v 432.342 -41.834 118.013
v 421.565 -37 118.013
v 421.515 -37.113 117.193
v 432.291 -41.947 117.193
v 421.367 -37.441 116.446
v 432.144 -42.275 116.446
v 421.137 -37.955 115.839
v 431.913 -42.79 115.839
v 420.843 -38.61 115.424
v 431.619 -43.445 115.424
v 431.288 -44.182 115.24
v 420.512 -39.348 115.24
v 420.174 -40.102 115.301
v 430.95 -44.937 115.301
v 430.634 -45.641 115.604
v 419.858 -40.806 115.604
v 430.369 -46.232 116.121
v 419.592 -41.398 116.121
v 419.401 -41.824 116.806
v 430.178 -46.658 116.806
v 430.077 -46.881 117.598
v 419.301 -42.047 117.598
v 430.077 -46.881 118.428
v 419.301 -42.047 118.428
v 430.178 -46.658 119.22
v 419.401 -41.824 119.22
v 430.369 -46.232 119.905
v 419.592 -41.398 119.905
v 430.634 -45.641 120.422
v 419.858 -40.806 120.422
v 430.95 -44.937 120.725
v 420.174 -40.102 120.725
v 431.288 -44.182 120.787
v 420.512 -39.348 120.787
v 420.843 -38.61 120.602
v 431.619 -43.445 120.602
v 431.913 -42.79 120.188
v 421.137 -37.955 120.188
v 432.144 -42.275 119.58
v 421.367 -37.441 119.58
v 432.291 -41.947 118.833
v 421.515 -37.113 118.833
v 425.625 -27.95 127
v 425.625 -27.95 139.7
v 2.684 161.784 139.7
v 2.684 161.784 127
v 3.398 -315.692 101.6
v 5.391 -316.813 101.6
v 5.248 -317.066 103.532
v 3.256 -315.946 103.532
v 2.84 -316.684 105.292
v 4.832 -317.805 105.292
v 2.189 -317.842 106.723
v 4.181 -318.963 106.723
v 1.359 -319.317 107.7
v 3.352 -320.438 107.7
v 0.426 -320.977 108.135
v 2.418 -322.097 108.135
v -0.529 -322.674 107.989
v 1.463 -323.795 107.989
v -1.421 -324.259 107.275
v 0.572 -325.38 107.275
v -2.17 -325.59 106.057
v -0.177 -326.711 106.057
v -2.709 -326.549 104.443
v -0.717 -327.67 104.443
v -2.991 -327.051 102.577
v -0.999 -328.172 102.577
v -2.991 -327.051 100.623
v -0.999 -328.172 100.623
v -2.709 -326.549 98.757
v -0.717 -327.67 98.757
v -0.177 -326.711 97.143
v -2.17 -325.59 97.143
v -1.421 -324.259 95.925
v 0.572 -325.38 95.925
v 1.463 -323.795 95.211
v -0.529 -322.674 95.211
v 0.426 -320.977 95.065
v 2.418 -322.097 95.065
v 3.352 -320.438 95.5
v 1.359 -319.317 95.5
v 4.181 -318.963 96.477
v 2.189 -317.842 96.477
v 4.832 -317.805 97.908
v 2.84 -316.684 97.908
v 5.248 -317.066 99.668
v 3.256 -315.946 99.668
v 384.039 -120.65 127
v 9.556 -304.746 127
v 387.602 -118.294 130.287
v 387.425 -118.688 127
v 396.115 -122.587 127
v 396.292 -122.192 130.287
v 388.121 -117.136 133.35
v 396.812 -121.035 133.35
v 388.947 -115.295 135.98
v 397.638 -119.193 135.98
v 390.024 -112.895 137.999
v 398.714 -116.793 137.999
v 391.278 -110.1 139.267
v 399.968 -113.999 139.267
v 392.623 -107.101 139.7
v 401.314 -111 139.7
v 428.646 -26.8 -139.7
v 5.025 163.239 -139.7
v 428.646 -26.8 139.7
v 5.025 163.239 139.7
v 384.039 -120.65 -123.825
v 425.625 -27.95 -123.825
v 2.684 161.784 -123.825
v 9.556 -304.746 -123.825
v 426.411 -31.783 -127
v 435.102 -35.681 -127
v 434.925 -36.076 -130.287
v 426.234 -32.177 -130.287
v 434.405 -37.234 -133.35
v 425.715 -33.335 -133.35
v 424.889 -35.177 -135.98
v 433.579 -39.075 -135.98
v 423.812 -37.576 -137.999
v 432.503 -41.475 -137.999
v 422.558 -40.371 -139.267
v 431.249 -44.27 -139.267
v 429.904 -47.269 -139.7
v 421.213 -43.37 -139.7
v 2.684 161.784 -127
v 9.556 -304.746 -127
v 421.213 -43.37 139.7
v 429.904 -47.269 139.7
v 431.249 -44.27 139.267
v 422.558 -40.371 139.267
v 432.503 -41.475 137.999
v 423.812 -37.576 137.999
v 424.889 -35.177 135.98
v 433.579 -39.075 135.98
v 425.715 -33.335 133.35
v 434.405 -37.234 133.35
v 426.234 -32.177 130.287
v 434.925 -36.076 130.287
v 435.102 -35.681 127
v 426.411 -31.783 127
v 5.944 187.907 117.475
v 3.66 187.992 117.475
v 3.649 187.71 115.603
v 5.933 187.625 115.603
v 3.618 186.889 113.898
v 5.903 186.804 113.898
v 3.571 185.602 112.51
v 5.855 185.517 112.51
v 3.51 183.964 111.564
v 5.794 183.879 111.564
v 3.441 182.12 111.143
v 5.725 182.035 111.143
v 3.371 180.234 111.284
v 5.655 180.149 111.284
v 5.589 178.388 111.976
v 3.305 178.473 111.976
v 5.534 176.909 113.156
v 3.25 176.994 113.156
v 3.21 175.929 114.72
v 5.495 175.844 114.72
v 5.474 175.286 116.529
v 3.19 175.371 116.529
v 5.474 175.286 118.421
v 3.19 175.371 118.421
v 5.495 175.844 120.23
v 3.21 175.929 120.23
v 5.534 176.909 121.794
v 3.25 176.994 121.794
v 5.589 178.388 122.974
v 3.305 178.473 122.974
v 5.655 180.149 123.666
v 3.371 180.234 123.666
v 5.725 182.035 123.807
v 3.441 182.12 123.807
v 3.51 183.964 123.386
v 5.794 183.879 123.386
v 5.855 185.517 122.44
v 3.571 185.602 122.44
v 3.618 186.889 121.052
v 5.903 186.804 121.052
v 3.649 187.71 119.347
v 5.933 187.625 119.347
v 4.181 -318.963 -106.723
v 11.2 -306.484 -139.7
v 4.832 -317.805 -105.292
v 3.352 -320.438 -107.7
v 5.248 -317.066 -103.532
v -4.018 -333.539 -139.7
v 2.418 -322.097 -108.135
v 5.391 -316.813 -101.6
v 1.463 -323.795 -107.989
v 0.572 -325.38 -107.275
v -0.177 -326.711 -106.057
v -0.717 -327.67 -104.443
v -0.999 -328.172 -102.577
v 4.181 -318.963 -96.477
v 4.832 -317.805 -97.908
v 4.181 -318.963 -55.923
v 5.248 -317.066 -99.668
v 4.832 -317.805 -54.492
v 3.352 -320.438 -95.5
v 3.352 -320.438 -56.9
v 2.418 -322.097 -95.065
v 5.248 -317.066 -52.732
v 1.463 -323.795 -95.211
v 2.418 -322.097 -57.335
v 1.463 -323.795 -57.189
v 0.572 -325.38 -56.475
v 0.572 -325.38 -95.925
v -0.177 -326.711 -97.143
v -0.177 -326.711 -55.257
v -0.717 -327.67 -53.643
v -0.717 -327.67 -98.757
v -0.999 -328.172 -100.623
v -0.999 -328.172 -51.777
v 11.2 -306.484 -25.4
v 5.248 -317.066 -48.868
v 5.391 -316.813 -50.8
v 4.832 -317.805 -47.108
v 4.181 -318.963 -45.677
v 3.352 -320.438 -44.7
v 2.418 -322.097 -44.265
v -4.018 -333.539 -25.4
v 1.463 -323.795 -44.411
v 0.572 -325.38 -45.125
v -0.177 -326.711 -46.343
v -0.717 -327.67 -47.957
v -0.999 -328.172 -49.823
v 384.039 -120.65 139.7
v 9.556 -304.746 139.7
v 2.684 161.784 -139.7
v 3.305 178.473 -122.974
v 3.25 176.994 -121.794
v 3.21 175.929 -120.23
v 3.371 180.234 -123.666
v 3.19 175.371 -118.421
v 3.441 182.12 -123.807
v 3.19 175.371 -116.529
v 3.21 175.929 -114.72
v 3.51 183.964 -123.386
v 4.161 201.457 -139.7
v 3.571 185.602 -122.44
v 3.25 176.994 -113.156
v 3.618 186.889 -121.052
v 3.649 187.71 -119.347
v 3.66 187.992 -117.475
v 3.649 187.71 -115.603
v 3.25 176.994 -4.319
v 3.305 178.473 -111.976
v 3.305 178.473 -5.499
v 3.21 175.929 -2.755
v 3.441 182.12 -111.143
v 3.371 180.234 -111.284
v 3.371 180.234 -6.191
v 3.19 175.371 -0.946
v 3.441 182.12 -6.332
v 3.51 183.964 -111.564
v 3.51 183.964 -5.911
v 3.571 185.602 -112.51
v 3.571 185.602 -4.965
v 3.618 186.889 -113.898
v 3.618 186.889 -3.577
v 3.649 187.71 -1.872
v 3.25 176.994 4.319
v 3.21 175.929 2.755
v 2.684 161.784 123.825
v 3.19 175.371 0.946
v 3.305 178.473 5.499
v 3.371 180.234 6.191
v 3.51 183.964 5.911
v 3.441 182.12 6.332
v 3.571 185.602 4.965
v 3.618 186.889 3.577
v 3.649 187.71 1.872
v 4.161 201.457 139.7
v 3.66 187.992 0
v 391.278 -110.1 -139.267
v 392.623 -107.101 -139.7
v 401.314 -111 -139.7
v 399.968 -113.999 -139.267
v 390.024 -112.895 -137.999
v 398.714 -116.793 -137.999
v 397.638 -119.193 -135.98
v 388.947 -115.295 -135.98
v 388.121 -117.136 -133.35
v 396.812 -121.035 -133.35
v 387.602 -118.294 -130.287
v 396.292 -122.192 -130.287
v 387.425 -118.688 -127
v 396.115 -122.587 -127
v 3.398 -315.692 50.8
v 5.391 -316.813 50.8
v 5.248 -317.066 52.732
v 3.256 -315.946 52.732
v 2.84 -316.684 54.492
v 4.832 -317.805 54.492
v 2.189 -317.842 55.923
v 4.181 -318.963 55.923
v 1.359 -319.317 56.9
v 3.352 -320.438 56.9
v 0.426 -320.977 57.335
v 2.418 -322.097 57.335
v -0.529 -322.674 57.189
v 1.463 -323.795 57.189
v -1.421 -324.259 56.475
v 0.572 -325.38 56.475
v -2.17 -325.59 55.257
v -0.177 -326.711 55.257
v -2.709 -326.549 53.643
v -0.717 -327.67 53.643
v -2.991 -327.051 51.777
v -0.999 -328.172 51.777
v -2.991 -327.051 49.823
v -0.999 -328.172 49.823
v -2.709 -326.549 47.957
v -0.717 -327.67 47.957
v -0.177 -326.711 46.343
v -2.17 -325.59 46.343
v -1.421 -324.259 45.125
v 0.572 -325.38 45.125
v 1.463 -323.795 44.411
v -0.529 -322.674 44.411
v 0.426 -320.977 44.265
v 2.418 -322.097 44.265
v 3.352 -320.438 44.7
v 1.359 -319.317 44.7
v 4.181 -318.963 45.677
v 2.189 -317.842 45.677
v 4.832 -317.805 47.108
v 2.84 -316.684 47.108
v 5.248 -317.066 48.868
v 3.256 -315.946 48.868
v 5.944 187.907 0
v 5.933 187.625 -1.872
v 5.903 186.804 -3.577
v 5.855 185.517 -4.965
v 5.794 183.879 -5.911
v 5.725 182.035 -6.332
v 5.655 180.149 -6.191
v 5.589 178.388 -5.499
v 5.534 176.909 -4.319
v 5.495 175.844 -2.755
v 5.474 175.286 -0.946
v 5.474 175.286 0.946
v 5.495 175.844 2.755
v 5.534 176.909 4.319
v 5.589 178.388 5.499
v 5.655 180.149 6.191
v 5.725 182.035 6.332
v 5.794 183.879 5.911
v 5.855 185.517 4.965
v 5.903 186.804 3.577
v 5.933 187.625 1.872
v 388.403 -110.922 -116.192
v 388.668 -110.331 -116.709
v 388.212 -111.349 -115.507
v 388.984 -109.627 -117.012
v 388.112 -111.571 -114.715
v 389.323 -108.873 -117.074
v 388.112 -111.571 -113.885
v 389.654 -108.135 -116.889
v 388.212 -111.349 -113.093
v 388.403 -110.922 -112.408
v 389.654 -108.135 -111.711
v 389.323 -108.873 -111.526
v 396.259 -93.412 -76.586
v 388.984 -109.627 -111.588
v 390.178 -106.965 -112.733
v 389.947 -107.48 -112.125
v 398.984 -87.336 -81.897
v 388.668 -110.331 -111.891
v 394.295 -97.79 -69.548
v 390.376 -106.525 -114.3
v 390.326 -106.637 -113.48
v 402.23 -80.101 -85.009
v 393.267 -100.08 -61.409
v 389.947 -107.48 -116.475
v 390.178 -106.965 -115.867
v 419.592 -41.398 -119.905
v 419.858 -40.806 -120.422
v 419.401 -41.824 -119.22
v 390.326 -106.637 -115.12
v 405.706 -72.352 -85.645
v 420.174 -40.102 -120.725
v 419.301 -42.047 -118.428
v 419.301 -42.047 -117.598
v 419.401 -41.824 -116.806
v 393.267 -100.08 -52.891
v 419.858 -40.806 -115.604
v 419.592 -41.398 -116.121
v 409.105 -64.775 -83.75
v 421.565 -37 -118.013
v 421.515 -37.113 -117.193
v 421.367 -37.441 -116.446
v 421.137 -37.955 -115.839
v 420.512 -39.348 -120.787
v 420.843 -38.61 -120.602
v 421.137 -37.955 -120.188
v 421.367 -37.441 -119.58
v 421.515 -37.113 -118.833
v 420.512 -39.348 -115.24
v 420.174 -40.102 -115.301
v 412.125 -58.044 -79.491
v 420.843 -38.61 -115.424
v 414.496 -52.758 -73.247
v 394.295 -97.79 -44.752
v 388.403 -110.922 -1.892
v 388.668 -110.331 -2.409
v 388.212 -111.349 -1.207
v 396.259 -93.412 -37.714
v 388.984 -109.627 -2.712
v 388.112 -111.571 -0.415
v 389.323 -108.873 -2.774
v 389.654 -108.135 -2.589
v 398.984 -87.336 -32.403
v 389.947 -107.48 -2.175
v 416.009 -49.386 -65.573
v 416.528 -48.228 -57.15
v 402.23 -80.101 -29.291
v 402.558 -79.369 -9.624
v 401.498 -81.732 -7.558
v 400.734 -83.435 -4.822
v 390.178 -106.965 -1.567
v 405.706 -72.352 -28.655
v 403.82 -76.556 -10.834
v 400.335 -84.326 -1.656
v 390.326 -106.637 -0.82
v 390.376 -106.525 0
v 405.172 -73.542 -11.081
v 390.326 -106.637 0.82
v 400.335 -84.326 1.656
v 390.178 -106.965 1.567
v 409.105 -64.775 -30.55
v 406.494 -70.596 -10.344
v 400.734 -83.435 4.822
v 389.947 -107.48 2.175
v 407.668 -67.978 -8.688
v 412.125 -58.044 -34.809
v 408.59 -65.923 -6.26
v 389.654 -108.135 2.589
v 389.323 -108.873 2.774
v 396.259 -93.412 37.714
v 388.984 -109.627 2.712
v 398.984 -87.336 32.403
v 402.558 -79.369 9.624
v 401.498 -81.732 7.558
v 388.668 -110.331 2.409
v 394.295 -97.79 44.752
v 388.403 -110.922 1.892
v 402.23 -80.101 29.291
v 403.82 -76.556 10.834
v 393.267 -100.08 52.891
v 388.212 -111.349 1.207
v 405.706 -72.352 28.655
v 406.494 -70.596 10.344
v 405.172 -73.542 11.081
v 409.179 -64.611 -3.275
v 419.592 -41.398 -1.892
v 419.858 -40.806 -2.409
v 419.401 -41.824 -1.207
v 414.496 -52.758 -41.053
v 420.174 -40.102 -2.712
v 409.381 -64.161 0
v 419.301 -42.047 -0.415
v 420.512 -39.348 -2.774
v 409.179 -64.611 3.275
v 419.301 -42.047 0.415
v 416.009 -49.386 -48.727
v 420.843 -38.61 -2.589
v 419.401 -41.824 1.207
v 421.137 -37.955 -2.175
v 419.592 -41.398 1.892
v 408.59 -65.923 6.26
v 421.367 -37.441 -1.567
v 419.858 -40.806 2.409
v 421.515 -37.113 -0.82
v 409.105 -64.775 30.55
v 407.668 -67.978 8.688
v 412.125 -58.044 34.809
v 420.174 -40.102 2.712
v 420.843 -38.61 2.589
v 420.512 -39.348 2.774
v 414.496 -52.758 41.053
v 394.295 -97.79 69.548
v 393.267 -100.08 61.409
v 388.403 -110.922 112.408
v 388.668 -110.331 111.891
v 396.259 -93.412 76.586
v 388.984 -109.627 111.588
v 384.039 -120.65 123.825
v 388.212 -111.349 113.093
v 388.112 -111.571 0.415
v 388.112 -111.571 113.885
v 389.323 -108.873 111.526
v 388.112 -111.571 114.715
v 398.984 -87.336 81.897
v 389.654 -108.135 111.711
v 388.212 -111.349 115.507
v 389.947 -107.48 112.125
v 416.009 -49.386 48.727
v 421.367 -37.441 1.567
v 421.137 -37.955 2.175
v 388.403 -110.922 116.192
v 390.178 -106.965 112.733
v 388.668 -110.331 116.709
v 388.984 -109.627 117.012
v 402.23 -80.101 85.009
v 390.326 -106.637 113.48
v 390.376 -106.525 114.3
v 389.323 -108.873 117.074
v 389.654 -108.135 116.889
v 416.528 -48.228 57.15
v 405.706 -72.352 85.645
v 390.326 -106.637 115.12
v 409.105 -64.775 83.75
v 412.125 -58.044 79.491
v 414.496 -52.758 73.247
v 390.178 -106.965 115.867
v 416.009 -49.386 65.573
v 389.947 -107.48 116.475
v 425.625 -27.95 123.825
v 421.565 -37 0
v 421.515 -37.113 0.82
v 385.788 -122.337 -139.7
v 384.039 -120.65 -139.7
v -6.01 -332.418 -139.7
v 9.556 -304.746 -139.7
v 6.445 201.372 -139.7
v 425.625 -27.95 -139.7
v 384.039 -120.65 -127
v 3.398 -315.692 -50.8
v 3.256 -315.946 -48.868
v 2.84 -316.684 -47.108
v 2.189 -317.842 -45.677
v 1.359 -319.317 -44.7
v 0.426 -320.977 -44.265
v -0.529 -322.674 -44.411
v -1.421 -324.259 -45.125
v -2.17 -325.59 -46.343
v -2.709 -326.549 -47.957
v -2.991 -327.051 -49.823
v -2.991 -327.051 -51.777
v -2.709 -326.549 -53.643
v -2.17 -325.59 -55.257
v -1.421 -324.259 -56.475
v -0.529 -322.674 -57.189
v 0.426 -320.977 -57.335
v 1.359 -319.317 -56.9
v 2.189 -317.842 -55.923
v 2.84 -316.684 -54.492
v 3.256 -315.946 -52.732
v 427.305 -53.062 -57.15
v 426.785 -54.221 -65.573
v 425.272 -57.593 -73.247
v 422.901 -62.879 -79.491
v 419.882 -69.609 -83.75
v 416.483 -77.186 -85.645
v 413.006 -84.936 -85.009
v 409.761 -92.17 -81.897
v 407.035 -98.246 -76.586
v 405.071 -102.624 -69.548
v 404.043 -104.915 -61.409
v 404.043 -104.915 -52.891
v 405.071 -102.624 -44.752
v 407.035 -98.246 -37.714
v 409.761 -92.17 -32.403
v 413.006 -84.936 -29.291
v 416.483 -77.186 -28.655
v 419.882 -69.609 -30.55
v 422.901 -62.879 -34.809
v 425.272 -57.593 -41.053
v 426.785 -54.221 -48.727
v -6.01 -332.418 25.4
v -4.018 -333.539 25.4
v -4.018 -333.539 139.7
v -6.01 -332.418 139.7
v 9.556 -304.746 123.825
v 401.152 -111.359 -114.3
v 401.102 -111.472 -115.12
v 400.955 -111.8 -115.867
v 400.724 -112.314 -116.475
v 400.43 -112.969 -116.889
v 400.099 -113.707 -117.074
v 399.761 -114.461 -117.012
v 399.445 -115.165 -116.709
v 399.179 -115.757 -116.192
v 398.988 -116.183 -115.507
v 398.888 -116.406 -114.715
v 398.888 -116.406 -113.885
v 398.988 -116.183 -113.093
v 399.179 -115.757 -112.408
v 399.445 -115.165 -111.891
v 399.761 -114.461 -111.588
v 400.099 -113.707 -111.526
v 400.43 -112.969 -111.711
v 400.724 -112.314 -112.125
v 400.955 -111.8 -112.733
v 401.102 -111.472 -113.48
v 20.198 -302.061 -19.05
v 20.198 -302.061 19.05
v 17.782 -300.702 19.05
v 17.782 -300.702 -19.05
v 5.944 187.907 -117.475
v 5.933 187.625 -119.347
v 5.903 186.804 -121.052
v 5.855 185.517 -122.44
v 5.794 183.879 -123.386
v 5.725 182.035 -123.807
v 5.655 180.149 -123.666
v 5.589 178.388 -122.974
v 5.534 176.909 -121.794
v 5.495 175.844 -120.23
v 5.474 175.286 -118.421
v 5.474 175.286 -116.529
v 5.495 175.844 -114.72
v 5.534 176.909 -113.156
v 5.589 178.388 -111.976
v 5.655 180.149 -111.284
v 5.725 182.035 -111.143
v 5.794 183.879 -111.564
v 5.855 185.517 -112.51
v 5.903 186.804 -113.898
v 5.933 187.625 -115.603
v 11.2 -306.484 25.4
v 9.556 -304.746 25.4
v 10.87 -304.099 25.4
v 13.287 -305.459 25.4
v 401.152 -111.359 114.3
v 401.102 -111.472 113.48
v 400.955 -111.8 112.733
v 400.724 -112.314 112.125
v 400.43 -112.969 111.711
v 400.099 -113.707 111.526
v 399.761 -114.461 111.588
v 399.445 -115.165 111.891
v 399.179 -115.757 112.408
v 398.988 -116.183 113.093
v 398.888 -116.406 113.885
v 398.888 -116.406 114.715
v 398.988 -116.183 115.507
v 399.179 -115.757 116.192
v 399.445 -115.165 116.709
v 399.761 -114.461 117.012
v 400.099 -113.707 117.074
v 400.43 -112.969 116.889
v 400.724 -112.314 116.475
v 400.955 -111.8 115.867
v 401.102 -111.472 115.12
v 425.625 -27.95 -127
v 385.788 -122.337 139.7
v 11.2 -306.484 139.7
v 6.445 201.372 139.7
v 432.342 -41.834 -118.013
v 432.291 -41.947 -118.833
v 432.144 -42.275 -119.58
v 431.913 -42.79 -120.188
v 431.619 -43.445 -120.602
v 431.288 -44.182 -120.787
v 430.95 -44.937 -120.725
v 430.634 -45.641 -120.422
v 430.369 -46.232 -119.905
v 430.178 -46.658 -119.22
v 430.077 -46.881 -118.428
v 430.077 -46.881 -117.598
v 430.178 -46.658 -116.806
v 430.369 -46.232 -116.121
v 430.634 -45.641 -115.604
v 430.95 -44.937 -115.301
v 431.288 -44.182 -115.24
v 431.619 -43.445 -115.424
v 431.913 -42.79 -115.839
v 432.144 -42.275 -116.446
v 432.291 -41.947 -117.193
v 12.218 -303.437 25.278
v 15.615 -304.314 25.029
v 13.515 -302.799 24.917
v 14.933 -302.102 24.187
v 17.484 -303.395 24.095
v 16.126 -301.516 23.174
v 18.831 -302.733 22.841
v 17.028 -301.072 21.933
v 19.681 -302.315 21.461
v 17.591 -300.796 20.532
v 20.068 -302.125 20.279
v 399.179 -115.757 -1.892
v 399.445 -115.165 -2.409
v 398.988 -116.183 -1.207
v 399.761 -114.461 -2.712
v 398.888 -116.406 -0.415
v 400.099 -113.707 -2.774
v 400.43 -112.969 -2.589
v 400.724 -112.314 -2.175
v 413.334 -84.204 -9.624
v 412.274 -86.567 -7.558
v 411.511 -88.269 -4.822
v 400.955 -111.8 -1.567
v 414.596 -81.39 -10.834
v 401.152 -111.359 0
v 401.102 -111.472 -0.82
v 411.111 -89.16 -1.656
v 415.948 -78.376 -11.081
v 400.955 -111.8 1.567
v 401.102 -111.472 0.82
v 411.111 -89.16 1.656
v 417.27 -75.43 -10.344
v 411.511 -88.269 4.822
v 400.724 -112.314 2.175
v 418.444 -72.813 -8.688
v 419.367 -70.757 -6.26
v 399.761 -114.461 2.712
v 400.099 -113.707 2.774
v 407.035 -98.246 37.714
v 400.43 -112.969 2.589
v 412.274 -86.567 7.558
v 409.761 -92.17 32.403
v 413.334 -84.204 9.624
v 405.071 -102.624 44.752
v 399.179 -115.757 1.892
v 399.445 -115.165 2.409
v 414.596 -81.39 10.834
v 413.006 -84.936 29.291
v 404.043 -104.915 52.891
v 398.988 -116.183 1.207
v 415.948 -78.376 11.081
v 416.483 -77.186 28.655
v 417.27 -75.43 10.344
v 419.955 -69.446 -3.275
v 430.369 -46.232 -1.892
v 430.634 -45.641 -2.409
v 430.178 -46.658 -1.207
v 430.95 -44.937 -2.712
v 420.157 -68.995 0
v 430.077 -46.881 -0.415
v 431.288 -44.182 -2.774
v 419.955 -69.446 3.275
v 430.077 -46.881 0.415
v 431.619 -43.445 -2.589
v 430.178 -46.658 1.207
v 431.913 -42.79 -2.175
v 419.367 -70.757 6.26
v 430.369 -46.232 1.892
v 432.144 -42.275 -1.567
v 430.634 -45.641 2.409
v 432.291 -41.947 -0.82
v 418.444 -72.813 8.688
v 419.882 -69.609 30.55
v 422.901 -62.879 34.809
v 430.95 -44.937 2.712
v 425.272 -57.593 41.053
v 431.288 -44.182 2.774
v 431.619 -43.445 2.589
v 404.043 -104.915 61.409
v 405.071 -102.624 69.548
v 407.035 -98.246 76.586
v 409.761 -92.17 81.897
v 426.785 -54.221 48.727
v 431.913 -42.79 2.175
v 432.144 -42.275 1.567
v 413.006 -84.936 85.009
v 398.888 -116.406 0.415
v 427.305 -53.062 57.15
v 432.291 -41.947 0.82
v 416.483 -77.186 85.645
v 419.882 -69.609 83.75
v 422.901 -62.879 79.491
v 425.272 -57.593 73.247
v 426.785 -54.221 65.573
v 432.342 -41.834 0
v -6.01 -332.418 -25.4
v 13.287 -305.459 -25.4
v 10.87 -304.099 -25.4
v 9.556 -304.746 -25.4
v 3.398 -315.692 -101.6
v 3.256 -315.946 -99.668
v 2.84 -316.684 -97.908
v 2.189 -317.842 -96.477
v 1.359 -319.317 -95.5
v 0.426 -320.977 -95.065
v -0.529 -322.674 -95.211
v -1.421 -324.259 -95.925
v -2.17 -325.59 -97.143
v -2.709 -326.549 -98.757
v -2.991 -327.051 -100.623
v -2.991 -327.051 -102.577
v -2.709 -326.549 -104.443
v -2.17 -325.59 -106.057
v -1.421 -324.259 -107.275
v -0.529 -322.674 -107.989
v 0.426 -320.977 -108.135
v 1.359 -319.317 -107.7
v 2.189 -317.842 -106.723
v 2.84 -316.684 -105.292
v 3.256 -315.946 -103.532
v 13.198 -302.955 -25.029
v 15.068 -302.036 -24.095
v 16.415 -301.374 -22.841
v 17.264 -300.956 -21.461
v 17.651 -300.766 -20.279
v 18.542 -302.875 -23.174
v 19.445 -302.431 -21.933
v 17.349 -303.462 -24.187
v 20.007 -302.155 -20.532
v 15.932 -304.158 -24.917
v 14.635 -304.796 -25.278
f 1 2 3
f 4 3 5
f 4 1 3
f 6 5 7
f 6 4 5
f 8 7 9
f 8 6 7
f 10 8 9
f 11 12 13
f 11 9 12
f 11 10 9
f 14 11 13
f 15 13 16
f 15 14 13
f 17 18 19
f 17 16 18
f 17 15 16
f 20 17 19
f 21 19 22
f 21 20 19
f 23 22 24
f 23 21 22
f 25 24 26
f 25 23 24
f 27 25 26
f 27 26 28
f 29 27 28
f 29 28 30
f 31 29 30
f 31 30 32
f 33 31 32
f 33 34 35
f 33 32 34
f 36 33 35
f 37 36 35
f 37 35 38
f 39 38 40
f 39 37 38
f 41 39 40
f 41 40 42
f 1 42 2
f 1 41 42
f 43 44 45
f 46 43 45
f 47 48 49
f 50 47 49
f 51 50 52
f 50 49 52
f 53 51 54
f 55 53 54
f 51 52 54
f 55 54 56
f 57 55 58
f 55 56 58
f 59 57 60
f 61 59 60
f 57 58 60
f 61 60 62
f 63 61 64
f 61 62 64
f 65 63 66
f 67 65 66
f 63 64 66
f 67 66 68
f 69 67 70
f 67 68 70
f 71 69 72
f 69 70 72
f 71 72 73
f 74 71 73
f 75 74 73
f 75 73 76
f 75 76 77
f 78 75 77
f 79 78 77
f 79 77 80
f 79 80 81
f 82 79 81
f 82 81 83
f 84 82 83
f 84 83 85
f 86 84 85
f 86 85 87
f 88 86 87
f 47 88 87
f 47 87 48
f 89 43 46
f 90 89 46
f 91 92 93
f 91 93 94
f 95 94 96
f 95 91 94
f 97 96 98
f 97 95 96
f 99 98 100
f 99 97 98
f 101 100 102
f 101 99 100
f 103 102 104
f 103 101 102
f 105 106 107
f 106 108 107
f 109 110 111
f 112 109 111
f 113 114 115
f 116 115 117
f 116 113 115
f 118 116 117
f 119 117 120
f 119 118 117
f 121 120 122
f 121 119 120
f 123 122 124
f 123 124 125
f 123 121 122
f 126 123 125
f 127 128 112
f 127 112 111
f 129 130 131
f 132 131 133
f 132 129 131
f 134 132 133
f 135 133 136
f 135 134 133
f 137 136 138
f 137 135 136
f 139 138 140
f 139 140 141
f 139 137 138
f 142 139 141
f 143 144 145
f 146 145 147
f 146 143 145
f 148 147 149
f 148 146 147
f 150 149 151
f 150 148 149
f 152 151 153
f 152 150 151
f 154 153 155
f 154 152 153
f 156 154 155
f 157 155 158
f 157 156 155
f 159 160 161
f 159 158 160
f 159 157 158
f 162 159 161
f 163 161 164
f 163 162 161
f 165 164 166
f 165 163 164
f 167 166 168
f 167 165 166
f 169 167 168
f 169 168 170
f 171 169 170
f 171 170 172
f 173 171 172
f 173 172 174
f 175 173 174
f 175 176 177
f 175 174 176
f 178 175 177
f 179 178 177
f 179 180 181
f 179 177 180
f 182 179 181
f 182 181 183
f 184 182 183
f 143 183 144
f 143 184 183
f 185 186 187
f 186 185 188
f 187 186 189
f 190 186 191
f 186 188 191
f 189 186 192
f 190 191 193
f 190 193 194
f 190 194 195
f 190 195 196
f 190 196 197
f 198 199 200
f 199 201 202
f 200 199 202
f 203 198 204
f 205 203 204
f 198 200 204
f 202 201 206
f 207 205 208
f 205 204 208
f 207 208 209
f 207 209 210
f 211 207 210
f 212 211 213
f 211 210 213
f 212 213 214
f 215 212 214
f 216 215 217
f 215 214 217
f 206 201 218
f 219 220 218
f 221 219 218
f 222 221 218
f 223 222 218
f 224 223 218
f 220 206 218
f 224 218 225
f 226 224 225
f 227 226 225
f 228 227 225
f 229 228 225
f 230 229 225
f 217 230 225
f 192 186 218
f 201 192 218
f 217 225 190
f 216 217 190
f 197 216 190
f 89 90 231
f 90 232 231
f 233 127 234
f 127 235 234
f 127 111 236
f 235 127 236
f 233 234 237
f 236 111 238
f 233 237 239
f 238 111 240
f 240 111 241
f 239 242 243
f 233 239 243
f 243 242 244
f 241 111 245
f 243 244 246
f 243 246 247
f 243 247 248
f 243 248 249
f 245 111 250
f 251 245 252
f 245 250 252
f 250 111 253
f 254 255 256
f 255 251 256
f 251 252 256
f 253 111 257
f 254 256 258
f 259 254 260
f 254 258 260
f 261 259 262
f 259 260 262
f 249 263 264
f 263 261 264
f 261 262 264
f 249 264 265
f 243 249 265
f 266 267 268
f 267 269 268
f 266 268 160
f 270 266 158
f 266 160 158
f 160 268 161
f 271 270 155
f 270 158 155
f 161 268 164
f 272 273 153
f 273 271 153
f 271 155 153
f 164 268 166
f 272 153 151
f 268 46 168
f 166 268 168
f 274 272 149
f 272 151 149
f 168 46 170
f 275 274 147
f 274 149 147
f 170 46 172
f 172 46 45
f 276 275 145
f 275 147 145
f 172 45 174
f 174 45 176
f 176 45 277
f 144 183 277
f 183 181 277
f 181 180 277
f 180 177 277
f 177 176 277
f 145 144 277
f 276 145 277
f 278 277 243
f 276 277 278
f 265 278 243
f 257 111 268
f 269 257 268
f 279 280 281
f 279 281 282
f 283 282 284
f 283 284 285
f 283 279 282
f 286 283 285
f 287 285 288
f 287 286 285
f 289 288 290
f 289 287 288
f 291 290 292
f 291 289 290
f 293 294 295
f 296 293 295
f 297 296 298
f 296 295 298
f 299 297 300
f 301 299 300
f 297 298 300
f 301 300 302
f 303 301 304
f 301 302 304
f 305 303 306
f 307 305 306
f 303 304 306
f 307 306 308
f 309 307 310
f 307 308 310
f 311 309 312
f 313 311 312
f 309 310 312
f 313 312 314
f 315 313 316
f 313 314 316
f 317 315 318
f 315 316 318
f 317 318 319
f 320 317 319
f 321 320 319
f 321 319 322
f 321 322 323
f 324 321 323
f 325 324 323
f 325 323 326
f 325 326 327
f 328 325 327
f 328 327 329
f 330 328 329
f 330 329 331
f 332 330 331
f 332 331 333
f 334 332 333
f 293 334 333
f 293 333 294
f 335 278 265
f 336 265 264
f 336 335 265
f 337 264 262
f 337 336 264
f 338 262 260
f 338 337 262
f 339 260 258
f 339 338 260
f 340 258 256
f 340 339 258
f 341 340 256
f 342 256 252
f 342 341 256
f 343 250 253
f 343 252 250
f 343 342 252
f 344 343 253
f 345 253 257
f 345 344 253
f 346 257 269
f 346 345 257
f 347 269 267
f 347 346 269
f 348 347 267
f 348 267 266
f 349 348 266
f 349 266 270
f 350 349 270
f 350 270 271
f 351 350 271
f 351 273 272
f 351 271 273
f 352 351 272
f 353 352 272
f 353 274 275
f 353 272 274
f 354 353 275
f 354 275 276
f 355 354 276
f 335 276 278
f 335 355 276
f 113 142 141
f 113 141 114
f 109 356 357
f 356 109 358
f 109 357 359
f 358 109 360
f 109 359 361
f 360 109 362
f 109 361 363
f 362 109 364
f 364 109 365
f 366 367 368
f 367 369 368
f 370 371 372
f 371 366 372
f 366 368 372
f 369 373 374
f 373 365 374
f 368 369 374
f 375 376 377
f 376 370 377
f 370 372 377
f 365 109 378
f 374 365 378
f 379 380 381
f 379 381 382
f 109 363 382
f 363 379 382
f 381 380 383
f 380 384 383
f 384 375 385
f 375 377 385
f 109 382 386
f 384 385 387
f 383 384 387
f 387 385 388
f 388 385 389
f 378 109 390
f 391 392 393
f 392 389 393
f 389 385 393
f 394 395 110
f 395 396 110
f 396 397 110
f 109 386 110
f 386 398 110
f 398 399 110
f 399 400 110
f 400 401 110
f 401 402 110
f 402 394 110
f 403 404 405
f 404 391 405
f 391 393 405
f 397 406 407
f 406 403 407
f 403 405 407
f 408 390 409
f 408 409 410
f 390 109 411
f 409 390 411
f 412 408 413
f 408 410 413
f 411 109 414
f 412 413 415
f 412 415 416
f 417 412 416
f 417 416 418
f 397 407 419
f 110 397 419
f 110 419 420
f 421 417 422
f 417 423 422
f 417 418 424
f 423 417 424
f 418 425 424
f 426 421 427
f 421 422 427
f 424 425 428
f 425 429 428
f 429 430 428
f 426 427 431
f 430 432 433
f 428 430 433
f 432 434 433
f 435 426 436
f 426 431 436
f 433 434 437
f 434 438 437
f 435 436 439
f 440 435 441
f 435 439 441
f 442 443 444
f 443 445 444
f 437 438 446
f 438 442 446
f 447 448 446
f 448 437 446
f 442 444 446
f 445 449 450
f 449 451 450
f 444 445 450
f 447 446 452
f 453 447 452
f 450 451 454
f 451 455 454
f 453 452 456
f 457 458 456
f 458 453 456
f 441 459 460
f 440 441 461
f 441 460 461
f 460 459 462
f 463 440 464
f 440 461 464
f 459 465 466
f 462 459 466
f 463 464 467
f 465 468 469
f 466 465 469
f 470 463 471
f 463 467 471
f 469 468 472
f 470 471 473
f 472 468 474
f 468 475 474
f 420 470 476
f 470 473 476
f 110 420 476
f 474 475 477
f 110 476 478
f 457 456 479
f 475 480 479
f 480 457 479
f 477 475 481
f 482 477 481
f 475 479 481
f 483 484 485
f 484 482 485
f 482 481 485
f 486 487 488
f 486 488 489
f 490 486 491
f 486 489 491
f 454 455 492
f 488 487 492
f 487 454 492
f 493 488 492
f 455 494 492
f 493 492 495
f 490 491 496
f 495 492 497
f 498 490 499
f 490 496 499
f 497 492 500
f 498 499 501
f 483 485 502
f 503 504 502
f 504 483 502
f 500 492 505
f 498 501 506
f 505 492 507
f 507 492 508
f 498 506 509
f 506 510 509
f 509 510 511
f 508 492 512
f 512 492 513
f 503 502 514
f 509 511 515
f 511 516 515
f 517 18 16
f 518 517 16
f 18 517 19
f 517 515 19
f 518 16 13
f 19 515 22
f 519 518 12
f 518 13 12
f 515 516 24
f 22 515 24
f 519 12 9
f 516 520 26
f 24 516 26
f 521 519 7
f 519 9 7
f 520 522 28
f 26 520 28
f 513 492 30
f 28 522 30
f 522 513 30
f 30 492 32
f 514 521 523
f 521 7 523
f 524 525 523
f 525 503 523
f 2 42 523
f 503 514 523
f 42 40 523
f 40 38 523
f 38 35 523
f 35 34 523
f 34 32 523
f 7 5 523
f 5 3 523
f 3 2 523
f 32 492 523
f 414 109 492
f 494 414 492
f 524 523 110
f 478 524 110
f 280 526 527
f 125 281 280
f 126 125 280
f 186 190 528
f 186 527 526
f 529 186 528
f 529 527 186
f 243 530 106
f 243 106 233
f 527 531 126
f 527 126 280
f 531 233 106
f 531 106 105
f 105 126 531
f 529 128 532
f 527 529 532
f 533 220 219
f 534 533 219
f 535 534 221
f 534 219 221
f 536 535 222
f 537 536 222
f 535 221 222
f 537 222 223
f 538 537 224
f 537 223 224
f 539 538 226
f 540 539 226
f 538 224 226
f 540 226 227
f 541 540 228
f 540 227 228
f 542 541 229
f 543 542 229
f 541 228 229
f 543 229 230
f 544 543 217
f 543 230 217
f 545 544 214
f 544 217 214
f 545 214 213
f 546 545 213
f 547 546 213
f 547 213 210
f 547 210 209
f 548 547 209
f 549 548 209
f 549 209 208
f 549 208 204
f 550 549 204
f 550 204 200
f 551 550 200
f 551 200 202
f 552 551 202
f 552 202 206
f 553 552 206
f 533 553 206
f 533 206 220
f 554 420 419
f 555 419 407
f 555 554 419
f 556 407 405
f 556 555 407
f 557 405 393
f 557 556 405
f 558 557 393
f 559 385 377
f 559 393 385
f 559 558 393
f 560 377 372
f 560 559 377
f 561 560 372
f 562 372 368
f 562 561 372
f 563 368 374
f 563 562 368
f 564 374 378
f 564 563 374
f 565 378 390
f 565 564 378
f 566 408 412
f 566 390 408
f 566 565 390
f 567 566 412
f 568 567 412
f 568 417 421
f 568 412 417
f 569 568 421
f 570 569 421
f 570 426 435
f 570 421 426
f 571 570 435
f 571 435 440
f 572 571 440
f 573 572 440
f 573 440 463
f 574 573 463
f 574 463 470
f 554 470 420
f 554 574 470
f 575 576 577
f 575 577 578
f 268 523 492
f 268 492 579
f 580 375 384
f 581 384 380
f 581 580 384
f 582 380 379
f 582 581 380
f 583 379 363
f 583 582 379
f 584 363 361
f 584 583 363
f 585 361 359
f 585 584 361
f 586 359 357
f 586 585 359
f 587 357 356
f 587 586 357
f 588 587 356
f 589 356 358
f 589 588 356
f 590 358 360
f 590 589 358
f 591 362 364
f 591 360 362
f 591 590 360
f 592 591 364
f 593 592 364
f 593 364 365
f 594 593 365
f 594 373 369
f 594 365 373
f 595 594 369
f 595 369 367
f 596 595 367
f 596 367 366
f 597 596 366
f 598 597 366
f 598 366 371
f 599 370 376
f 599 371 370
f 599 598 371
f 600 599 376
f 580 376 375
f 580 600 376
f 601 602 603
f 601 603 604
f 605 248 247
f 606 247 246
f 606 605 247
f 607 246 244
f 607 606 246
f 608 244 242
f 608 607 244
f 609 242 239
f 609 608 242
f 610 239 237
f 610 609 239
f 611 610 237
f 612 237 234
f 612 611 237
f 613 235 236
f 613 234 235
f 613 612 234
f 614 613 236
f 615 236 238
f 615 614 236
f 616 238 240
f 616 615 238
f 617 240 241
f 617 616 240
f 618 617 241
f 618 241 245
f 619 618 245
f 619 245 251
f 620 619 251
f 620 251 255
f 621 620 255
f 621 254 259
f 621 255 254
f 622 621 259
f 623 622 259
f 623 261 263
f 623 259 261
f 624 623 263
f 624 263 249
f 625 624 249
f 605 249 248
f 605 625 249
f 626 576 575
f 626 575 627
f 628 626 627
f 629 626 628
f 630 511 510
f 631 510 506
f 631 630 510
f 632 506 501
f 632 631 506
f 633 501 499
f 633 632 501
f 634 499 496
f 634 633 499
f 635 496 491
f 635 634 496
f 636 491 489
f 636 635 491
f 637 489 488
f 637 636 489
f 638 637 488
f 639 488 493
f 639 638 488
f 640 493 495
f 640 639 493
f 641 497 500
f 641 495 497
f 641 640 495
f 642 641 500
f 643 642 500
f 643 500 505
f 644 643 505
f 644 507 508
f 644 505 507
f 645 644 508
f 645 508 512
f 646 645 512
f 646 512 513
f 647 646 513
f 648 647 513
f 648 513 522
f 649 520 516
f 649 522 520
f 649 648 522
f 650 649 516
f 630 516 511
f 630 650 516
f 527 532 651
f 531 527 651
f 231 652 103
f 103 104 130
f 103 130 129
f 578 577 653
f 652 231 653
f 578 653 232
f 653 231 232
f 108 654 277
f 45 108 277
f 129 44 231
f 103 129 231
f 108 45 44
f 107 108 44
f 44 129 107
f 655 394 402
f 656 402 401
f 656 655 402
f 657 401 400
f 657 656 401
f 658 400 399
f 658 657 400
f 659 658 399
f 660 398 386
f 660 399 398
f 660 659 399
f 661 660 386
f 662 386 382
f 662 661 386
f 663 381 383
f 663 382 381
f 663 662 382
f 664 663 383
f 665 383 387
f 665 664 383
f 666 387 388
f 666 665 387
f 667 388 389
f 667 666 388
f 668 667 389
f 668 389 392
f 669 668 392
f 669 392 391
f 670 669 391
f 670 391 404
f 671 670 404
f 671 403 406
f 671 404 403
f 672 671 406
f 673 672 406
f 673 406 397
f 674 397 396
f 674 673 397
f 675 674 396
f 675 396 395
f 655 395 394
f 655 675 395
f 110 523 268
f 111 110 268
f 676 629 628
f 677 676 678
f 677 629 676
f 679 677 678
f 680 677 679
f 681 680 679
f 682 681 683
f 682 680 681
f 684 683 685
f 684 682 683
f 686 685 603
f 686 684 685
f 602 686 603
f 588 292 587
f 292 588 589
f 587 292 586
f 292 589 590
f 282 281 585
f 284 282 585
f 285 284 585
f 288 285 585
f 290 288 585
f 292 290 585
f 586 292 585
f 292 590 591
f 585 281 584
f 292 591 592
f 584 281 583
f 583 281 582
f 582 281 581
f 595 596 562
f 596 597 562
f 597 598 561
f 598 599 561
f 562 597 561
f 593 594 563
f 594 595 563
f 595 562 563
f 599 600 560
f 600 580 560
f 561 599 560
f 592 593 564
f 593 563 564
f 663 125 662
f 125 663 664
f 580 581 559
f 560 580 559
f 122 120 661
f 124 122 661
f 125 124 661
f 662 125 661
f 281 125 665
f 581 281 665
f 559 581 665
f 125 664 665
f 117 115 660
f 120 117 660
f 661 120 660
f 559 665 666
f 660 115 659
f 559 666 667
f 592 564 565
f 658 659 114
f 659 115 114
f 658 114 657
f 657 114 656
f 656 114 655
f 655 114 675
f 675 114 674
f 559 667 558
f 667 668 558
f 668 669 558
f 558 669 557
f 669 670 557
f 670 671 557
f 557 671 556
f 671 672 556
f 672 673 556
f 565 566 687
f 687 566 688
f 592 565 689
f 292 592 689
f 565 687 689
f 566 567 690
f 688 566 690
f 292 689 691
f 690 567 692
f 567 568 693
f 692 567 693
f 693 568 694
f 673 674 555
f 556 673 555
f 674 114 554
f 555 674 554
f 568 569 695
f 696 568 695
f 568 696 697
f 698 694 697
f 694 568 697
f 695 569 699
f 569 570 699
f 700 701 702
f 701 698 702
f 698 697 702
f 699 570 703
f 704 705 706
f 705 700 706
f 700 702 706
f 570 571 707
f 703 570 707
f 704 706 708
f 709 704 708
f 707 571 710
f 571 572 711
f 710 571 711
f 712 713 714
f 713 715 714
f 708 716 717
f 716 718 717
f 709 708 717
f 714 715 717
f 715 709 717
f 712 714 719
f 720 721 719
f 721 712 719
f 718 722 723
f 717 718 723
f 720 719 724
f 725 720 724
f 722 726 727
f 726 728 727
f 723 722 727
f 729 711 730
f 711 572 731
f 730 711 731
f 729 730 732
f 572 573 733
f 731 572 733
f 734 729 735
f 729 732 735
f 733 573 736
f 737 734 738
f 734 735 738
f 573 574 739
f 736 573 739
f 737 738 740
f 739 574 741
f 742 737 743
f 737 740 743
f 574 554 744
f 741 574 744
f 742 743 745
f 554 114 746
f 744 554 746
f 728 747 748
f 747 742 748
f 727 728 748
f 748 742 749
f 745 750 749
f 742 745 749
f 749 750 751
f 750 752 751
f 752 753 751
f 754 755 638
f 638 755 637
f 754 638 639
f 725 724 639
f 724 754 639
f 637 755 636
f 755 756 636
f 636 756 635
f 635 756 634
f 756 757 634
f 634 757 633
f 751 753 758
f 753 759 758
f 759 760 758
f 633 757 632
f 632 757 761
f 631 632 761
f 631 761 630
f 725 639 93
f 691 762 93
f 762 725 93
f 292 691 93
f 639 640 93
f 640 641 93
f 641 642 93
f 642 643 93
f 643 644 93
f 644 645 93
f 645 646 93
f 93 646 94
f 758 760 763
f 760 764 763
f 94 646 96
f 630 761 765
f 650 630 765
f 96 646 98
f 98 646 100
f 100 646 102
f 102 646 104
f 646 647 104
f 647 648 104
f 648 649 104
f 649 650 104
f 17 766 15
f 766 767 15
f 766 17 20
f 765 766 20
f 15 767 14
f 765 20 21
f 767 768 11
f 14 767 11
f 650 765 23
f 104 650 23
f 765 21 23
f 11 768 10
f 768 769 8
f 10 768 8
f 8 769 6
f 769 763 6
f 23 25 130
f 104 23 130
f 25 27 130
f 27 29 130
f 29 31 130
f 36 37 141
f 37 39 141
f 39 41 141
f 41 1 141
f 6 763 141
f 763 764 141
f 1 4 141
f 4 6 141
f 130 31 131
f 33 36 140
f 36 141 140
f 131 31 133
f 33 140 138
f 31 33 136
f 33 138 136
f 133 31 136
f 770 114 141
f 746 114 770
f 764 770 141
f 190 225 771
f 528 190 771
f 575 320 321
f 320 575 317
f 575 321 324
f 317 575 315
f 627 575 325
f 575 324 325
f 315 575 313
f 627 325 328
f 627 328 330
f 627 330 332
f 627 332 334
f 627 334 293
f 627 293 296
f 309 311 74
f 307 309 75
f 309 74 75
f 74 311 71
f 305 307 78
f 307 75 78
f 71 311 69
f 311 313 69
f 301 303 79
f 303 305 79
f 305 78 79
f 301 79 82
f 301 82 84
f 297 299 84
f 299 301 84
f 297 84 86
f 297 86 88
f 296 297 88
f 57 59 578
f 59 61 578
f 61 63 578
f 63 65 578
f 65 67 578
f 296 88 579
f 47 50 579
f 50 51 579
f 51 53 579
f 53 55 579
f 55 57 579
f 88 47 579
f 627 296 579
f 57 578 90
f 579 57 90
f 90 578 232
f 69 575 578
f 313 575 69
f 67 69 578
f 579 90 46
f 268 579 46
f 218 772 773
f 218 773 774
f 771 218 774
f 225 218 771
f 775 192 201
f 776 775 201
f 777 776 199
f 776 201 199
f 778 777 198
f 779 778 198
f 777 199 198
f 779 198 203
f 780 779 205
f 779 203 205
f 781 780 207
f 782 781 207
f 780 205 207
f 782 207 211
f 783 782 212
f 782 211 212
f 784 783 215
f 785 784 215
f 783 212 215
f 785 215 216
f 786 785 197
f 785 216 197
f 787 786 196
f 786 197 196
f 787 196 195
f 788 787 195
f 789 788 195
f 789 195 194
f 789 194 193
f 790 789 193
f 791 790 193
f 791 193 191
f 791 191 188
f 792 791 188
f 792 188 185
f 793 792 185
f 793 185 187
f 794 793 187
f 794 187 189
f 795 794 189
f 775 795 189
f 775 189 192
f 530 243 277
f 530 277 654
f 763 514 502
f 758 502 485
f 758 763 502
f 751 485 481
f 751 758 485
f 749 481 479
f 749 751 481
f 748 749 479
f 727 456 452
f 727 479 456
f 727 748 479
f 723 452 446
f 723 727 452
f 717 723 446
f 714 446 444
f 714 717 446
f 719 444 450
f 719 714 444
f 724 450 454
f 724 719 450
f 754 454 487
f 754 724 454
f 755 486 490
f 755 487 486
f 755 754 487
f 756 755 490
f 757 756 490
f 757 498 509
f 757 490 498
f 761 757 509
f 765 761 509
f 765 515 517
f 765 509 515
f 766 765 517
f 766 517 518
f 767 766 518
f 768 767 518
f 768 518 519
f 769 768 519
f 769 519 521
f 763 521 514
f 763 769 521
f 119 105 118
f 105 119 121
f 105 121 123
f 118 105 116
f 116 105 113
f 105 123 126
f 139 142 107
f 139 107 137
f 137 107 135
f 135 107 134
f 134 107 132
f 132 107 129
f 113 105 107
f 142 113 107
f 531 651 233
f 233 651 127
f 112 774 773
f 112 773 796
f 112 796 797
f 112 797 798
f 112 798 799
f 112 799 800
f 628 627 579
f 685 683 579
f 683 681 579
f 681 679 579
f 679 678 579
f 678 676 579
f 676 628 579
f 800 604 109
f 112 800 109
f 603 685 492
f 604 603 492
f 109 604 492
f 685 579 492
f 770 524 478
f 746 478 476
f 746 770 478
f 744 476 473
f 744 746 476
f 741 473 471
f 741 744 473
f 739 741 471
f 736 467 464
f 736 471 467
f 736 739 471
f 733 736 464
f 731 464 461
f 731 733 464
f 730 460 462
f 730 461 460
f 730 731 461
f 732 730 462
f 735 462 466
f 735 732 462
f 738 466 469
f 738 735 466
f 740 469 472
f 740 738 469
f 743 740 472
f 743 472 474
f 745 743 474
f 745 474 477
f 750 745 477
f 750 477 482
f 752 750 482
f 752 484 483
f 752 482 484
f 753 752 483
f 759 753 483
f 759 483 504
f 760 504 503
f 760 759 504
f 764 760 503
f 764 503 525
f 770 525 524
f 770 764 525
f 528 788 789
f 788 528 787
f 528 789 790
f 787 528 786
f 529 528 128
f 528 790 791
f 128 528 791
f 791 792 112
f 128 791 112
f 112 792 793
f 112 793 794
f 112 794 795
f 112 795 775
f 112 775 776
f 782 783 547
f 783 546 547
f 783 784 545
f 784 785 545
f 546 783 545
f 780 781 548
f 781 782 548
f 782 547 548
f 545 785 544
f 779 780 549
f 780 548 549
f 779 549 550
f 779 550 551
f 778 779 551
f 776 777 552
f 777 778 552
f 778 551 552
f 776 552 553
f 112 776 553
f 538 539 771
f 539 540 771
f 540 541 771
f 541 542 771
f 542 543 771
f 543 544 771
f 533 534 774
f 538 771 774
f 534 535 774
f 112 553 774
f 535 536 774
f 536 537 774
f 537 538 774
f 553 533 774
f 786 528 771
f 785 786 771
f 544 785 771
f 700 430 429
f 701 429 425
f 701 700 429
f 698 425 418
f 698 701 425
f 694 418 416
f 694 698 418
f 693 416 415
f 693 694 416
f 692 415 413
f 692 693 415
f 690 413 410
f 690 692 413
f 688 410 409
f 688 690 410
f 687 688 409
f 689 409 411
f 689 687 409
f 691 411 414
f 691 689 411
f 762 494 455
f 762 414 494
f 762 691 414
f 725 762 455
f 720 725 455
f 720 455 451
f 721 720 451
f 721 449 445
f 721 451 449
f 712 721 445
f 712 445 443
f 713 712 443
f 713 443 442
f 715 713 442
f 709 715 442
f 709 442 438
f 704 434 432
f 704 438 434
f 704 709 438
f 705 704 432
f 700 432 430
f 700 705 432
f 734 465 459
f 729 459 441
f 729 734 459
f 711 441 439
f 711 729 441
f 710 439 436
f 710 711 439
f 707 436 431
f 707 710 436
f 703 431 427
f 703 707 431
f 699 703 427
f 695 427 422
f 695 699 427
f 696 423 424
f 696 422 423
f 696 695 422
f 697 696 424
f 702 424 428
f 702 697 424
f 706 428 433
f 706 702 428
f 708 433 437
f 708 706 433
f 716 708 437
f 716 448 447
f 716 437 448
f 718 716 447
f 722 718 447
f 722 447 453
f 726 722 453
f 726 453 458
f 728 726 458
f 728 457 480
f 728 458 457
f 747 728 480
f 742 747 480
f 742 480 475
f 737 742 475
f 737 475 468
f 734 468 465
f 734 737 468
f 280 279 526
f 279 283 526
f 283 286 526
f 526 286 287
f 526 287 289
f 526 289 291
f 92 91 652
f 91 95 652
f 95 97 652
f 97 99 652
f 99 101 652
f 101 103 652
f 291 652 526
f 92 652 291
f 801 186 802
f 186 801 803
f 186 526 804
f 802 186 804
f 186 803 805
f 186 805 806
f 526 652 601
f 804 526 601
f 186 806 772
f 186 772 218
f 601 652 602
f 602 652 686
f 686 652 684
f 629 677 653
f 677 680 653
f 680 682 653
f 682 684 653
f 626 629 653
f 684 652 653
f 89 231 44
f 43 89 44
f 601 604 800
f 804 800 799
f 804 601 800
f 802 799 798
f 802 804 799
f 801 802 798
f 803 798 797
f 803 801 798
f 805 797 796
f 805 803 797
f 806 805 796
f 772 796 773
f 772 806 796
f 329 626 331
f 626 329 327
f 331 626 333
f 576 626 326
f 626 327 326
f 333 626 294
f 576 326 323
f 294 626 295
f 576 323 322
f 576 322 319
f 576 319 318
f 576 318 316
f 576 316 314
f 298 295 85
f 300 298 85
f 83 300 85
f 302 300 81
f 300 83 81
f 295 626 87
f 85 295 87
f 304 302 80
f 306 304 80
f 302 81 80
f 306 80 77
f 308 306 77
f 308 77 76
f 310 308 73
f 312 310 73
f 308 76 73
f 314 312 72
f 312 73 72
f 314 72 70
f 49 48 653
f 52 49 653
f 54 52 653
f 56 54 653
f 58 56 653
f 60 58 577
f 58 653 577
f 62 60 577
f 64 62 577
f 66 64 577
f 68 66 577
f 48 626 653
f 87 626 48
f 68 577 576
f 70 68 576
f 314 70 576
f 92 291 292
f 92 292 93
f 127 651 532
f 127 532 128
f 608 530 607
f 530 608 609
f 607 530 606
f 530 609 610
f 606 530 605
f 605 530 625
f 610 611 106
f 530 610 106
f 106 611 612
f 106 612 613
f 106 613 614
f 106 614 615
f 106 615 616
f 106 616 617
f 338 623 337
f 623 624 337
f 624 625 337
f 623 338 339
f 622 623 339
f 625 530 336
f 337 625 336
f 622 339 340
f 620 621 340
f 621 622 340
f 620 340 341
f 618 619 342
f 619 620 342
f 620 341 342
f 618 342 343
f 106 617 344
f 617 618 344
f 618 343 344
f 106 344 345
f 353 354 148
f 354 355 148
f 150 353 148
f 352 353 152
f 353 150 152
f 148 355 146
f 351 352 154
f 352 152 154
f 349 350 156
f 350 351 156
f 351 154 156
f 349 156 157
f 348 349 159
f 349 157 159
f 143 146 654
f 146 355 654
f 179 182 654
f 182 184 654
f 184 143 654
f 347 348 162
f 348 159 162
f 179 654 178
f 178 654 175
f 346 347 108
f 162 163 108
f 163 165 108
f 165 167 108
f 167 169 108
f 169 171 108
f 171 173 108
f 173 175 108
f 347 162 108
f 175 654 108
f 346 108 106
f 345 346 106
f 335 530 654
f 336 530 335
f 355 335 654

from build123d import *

# Parameters (mm, degrees)
EXTRUDE_THIN1_0_090_DEPTH       = 139.7
BE_00_FRONT_BEARING_PLATE_DEPTH = 9.525
SKETCH10_R                      = 2.7813
SKETCH10_R_2                    = 11.1125
SKETCH10_R_3                    = 28.575
CE_00_FRONT_HOLES_DEPTH         = 25.4
SKETCH11_R                      = 6.35
CE_00_UPPOER_HOLES_DEPTH        = 25.4
SKETCH12_R                      = 6.5532
CE_00_LOWER_HOLES_DEPTH         = 12.7
BE_00_START                     = -127
BE_00_SIDE_PANEL_DEPTH          = 3.175


with BuildPart() as part:
    # Sketch9 → Extrude-Thin1 0.090 (new, symmetric)
    with BuildSketch(Plane.XY):
        Polygon((-6.010227149, -332.418181598), (9.55556721, -304.745658294), (384.039485631, -120.64961833), (425.625062176, -27.95010472), (2.683531334, 161.784088268), (4.161010967, 201.456785856), (6.445427335, 201.371710254), (5.025301148, 163.239044684), (428.646476704, -26.800041136), (385.787807265, -122.337439943), (11.200381601, -306.484363998), (-4.017805471, -333.538918792), align=None)
    extrude(amount=EXTRUDE_THIN1_0_090_DEPTH, both=True)

    # Sketch13 → BE-00 Front Bearing Plate (add)
    with BuildSketch(Plane(origin=(366.842913711, -164.56800553, 0), x_dir=(0, 0, -1), z_dir=(0.9123967874925901, -0.40930685576129966, 0))):
        with BuildLine():
            Line((-127, 145.534670176), (127, 145.534670176))
            ThreePointArc((127, 145.534670176), (135.980256121, 141.814926297), (139.7, 132.834670176))
            Line((139.7, 132.834670176), (139.7, 62.984670176))
            ThreePointArc((139.7, 62.984670176), (135.980256121, 54.004414055), (127, 50.284670176))
            Line((127, 50.284670176), (-127, 50.284670176))
            ThreePointArc((-127, 50.284670176), (-135.980256121, 54.004414055), (-139.7, 62.984670176))
            Line((-139.7, 62.984670176), (-139.7, 132.834670176))
            ThreePointArc((-139.7, 132.834670176), (-135.980256121, 141.814926297), (-127, 145.534670176))
        make_face()
    extrude(amount=BE_00_FRONT_BEARING_PLATE_DEPTH)

    # Sketch10 → CE-00 Front Holes (cut)
    with BuildSketch(Plane(origin=(-463.262854861, -2038.249879483, 0), x_dir=(0, 0, -1), z_dir=(-0.9123967874925901, 0.40930685576129966, 0))):
        with Locations(Location((-118.013029727, -2185.318974837, 0), (0, 0, 270))):
            Circle(SKETCH10_R)
        with Locations(Location((0, -2147.218974837, 0), (0, 0, 270))):
            Circle(SKETCH10_R_2)
        with Locations(Location((57.15, -2147.218974837, 0), (0, 0, 270))):
            Circle(SKETCH10_R_3)
        with Locations(Location((114.3, -2109.118974837, 0), (0, 0, 270))):
            Circle(SKETCH10_R)
        with Locations(Location((118.013029727, -2185.318974837, 0), (0, 0, 270))):
            Circle(SKETCH10_R)
        with Locations(Location((0, -2109.118974837, 0), (0, 0, 270))):
            Circle(SKETCH10_R)
        with Locations(Location((0, -2185.318974837, 0), (0, 0, 270))):
            Circle(SKETCH10_R)
        with Locations(Location((-114.3, -2109.118974837, 0), (0, 0, 270))):
            Circle(SKETCH10_R)
        with Locations(Location((-57.15, -2147.218974837, 0), (0, 0, 270))):
            Circle(SKETCH10_R_3)
    extrude(amount=CE_00_FRONT_HOLES_DEPTH, mode=Mode.SUBTRACT)

    # Sketch11 → CE-00 Uppoer Holes (cut)
    with BuildSketch(Plane(origin=(-26.304972354, -678.029043238, 0), x_dir=(0, 0, -1), z_dir=(-0.9993072475406022, 0.037215924183416293, 0))):
        with Locations(Location((-117.475, -860.185852954, 0), (0, 0, 270))):
            Circle(SKETCH11_R)
        with Locations(Location((0, -860.185852954, 0), (0, 0, 270))):
            Circle(SKETCH11_R)
        with Locations(Location((117.475, -860.185852954, 0), (0, 0, 270))):
            Circle(SKETCH11_R)
    extrude(amount=CE_00_UPPOER_HOLES_DEPTH, mode=Mode.SUBTRACT)

    # Sketch12 → CE-00 Lower Holes (cut, symmetric)
    with BuildSketch(Plane(origin=(139.468979542, -78.451300992, 0), x_dir=(0, 0, -1), z_dir=(0.8715755371243086, -0.49026123963298696, 0))):
        with Locations(Location((101.6, -280.036485408, 0), (0, 0, 90))):
            Circle(SKETCH12_R)
        with Locations(Location((50.8, -280.036485408, 0), (0, 0, 90))):
            Circle(SKETCH12_R)
        with Locations(Location((-50.8, -280.036485408, 0), (0, 0, 90))):
            Circle(SKETCH12_R)
        with Locations(Location((-101.6, -280.036485408, 0), (0, 0, 90))):
            Circle(SKETCH12_R)
        with BuildLine():
            Line((-19.05, -253.366485408), (19.05, -253.366485408))
            ThreePointArc((19.05, -253.366485408), (23.540128061, -255.226357347), (25.4, -259.716485408))
            Line((25.4, -259.716485408), (25.4, -304.513722271))
            Line((25.4, -304.513722271), (-25.4, -304.513722271))
            Line((-25.4, -304.513722271), (-25.4, -259.716485408))
            ThreePointArc((-25.4, -259.716485408), (-23.540128061, -255.226357347), (-19.05, -253.366485408))
        make_face()
    extrude(amount=CE_00_LOWER_HOLES_DEPTH, both=True, mode=Mode.SUBTRACT)

    # Sketch14 → BE-00 Side Panel (add)
    with BuildSketch(Plane.XY.offset(BE_00_START)):
        Polygon((2.683531334, 161.784088268), (425.625062176, -27.95010472), (384.039485631, -120.64961833), (9.55556721, -304.745658294), align=None)
    be_00_side_panel = extrude(amount=BE_00_SIDE_PANEL_DEPTH)

    # MI-00 Side Panel: BE-00 Side Panel across plane
    add(be_00_side_panel.mirror(Plane.XY))


solid = part.part
